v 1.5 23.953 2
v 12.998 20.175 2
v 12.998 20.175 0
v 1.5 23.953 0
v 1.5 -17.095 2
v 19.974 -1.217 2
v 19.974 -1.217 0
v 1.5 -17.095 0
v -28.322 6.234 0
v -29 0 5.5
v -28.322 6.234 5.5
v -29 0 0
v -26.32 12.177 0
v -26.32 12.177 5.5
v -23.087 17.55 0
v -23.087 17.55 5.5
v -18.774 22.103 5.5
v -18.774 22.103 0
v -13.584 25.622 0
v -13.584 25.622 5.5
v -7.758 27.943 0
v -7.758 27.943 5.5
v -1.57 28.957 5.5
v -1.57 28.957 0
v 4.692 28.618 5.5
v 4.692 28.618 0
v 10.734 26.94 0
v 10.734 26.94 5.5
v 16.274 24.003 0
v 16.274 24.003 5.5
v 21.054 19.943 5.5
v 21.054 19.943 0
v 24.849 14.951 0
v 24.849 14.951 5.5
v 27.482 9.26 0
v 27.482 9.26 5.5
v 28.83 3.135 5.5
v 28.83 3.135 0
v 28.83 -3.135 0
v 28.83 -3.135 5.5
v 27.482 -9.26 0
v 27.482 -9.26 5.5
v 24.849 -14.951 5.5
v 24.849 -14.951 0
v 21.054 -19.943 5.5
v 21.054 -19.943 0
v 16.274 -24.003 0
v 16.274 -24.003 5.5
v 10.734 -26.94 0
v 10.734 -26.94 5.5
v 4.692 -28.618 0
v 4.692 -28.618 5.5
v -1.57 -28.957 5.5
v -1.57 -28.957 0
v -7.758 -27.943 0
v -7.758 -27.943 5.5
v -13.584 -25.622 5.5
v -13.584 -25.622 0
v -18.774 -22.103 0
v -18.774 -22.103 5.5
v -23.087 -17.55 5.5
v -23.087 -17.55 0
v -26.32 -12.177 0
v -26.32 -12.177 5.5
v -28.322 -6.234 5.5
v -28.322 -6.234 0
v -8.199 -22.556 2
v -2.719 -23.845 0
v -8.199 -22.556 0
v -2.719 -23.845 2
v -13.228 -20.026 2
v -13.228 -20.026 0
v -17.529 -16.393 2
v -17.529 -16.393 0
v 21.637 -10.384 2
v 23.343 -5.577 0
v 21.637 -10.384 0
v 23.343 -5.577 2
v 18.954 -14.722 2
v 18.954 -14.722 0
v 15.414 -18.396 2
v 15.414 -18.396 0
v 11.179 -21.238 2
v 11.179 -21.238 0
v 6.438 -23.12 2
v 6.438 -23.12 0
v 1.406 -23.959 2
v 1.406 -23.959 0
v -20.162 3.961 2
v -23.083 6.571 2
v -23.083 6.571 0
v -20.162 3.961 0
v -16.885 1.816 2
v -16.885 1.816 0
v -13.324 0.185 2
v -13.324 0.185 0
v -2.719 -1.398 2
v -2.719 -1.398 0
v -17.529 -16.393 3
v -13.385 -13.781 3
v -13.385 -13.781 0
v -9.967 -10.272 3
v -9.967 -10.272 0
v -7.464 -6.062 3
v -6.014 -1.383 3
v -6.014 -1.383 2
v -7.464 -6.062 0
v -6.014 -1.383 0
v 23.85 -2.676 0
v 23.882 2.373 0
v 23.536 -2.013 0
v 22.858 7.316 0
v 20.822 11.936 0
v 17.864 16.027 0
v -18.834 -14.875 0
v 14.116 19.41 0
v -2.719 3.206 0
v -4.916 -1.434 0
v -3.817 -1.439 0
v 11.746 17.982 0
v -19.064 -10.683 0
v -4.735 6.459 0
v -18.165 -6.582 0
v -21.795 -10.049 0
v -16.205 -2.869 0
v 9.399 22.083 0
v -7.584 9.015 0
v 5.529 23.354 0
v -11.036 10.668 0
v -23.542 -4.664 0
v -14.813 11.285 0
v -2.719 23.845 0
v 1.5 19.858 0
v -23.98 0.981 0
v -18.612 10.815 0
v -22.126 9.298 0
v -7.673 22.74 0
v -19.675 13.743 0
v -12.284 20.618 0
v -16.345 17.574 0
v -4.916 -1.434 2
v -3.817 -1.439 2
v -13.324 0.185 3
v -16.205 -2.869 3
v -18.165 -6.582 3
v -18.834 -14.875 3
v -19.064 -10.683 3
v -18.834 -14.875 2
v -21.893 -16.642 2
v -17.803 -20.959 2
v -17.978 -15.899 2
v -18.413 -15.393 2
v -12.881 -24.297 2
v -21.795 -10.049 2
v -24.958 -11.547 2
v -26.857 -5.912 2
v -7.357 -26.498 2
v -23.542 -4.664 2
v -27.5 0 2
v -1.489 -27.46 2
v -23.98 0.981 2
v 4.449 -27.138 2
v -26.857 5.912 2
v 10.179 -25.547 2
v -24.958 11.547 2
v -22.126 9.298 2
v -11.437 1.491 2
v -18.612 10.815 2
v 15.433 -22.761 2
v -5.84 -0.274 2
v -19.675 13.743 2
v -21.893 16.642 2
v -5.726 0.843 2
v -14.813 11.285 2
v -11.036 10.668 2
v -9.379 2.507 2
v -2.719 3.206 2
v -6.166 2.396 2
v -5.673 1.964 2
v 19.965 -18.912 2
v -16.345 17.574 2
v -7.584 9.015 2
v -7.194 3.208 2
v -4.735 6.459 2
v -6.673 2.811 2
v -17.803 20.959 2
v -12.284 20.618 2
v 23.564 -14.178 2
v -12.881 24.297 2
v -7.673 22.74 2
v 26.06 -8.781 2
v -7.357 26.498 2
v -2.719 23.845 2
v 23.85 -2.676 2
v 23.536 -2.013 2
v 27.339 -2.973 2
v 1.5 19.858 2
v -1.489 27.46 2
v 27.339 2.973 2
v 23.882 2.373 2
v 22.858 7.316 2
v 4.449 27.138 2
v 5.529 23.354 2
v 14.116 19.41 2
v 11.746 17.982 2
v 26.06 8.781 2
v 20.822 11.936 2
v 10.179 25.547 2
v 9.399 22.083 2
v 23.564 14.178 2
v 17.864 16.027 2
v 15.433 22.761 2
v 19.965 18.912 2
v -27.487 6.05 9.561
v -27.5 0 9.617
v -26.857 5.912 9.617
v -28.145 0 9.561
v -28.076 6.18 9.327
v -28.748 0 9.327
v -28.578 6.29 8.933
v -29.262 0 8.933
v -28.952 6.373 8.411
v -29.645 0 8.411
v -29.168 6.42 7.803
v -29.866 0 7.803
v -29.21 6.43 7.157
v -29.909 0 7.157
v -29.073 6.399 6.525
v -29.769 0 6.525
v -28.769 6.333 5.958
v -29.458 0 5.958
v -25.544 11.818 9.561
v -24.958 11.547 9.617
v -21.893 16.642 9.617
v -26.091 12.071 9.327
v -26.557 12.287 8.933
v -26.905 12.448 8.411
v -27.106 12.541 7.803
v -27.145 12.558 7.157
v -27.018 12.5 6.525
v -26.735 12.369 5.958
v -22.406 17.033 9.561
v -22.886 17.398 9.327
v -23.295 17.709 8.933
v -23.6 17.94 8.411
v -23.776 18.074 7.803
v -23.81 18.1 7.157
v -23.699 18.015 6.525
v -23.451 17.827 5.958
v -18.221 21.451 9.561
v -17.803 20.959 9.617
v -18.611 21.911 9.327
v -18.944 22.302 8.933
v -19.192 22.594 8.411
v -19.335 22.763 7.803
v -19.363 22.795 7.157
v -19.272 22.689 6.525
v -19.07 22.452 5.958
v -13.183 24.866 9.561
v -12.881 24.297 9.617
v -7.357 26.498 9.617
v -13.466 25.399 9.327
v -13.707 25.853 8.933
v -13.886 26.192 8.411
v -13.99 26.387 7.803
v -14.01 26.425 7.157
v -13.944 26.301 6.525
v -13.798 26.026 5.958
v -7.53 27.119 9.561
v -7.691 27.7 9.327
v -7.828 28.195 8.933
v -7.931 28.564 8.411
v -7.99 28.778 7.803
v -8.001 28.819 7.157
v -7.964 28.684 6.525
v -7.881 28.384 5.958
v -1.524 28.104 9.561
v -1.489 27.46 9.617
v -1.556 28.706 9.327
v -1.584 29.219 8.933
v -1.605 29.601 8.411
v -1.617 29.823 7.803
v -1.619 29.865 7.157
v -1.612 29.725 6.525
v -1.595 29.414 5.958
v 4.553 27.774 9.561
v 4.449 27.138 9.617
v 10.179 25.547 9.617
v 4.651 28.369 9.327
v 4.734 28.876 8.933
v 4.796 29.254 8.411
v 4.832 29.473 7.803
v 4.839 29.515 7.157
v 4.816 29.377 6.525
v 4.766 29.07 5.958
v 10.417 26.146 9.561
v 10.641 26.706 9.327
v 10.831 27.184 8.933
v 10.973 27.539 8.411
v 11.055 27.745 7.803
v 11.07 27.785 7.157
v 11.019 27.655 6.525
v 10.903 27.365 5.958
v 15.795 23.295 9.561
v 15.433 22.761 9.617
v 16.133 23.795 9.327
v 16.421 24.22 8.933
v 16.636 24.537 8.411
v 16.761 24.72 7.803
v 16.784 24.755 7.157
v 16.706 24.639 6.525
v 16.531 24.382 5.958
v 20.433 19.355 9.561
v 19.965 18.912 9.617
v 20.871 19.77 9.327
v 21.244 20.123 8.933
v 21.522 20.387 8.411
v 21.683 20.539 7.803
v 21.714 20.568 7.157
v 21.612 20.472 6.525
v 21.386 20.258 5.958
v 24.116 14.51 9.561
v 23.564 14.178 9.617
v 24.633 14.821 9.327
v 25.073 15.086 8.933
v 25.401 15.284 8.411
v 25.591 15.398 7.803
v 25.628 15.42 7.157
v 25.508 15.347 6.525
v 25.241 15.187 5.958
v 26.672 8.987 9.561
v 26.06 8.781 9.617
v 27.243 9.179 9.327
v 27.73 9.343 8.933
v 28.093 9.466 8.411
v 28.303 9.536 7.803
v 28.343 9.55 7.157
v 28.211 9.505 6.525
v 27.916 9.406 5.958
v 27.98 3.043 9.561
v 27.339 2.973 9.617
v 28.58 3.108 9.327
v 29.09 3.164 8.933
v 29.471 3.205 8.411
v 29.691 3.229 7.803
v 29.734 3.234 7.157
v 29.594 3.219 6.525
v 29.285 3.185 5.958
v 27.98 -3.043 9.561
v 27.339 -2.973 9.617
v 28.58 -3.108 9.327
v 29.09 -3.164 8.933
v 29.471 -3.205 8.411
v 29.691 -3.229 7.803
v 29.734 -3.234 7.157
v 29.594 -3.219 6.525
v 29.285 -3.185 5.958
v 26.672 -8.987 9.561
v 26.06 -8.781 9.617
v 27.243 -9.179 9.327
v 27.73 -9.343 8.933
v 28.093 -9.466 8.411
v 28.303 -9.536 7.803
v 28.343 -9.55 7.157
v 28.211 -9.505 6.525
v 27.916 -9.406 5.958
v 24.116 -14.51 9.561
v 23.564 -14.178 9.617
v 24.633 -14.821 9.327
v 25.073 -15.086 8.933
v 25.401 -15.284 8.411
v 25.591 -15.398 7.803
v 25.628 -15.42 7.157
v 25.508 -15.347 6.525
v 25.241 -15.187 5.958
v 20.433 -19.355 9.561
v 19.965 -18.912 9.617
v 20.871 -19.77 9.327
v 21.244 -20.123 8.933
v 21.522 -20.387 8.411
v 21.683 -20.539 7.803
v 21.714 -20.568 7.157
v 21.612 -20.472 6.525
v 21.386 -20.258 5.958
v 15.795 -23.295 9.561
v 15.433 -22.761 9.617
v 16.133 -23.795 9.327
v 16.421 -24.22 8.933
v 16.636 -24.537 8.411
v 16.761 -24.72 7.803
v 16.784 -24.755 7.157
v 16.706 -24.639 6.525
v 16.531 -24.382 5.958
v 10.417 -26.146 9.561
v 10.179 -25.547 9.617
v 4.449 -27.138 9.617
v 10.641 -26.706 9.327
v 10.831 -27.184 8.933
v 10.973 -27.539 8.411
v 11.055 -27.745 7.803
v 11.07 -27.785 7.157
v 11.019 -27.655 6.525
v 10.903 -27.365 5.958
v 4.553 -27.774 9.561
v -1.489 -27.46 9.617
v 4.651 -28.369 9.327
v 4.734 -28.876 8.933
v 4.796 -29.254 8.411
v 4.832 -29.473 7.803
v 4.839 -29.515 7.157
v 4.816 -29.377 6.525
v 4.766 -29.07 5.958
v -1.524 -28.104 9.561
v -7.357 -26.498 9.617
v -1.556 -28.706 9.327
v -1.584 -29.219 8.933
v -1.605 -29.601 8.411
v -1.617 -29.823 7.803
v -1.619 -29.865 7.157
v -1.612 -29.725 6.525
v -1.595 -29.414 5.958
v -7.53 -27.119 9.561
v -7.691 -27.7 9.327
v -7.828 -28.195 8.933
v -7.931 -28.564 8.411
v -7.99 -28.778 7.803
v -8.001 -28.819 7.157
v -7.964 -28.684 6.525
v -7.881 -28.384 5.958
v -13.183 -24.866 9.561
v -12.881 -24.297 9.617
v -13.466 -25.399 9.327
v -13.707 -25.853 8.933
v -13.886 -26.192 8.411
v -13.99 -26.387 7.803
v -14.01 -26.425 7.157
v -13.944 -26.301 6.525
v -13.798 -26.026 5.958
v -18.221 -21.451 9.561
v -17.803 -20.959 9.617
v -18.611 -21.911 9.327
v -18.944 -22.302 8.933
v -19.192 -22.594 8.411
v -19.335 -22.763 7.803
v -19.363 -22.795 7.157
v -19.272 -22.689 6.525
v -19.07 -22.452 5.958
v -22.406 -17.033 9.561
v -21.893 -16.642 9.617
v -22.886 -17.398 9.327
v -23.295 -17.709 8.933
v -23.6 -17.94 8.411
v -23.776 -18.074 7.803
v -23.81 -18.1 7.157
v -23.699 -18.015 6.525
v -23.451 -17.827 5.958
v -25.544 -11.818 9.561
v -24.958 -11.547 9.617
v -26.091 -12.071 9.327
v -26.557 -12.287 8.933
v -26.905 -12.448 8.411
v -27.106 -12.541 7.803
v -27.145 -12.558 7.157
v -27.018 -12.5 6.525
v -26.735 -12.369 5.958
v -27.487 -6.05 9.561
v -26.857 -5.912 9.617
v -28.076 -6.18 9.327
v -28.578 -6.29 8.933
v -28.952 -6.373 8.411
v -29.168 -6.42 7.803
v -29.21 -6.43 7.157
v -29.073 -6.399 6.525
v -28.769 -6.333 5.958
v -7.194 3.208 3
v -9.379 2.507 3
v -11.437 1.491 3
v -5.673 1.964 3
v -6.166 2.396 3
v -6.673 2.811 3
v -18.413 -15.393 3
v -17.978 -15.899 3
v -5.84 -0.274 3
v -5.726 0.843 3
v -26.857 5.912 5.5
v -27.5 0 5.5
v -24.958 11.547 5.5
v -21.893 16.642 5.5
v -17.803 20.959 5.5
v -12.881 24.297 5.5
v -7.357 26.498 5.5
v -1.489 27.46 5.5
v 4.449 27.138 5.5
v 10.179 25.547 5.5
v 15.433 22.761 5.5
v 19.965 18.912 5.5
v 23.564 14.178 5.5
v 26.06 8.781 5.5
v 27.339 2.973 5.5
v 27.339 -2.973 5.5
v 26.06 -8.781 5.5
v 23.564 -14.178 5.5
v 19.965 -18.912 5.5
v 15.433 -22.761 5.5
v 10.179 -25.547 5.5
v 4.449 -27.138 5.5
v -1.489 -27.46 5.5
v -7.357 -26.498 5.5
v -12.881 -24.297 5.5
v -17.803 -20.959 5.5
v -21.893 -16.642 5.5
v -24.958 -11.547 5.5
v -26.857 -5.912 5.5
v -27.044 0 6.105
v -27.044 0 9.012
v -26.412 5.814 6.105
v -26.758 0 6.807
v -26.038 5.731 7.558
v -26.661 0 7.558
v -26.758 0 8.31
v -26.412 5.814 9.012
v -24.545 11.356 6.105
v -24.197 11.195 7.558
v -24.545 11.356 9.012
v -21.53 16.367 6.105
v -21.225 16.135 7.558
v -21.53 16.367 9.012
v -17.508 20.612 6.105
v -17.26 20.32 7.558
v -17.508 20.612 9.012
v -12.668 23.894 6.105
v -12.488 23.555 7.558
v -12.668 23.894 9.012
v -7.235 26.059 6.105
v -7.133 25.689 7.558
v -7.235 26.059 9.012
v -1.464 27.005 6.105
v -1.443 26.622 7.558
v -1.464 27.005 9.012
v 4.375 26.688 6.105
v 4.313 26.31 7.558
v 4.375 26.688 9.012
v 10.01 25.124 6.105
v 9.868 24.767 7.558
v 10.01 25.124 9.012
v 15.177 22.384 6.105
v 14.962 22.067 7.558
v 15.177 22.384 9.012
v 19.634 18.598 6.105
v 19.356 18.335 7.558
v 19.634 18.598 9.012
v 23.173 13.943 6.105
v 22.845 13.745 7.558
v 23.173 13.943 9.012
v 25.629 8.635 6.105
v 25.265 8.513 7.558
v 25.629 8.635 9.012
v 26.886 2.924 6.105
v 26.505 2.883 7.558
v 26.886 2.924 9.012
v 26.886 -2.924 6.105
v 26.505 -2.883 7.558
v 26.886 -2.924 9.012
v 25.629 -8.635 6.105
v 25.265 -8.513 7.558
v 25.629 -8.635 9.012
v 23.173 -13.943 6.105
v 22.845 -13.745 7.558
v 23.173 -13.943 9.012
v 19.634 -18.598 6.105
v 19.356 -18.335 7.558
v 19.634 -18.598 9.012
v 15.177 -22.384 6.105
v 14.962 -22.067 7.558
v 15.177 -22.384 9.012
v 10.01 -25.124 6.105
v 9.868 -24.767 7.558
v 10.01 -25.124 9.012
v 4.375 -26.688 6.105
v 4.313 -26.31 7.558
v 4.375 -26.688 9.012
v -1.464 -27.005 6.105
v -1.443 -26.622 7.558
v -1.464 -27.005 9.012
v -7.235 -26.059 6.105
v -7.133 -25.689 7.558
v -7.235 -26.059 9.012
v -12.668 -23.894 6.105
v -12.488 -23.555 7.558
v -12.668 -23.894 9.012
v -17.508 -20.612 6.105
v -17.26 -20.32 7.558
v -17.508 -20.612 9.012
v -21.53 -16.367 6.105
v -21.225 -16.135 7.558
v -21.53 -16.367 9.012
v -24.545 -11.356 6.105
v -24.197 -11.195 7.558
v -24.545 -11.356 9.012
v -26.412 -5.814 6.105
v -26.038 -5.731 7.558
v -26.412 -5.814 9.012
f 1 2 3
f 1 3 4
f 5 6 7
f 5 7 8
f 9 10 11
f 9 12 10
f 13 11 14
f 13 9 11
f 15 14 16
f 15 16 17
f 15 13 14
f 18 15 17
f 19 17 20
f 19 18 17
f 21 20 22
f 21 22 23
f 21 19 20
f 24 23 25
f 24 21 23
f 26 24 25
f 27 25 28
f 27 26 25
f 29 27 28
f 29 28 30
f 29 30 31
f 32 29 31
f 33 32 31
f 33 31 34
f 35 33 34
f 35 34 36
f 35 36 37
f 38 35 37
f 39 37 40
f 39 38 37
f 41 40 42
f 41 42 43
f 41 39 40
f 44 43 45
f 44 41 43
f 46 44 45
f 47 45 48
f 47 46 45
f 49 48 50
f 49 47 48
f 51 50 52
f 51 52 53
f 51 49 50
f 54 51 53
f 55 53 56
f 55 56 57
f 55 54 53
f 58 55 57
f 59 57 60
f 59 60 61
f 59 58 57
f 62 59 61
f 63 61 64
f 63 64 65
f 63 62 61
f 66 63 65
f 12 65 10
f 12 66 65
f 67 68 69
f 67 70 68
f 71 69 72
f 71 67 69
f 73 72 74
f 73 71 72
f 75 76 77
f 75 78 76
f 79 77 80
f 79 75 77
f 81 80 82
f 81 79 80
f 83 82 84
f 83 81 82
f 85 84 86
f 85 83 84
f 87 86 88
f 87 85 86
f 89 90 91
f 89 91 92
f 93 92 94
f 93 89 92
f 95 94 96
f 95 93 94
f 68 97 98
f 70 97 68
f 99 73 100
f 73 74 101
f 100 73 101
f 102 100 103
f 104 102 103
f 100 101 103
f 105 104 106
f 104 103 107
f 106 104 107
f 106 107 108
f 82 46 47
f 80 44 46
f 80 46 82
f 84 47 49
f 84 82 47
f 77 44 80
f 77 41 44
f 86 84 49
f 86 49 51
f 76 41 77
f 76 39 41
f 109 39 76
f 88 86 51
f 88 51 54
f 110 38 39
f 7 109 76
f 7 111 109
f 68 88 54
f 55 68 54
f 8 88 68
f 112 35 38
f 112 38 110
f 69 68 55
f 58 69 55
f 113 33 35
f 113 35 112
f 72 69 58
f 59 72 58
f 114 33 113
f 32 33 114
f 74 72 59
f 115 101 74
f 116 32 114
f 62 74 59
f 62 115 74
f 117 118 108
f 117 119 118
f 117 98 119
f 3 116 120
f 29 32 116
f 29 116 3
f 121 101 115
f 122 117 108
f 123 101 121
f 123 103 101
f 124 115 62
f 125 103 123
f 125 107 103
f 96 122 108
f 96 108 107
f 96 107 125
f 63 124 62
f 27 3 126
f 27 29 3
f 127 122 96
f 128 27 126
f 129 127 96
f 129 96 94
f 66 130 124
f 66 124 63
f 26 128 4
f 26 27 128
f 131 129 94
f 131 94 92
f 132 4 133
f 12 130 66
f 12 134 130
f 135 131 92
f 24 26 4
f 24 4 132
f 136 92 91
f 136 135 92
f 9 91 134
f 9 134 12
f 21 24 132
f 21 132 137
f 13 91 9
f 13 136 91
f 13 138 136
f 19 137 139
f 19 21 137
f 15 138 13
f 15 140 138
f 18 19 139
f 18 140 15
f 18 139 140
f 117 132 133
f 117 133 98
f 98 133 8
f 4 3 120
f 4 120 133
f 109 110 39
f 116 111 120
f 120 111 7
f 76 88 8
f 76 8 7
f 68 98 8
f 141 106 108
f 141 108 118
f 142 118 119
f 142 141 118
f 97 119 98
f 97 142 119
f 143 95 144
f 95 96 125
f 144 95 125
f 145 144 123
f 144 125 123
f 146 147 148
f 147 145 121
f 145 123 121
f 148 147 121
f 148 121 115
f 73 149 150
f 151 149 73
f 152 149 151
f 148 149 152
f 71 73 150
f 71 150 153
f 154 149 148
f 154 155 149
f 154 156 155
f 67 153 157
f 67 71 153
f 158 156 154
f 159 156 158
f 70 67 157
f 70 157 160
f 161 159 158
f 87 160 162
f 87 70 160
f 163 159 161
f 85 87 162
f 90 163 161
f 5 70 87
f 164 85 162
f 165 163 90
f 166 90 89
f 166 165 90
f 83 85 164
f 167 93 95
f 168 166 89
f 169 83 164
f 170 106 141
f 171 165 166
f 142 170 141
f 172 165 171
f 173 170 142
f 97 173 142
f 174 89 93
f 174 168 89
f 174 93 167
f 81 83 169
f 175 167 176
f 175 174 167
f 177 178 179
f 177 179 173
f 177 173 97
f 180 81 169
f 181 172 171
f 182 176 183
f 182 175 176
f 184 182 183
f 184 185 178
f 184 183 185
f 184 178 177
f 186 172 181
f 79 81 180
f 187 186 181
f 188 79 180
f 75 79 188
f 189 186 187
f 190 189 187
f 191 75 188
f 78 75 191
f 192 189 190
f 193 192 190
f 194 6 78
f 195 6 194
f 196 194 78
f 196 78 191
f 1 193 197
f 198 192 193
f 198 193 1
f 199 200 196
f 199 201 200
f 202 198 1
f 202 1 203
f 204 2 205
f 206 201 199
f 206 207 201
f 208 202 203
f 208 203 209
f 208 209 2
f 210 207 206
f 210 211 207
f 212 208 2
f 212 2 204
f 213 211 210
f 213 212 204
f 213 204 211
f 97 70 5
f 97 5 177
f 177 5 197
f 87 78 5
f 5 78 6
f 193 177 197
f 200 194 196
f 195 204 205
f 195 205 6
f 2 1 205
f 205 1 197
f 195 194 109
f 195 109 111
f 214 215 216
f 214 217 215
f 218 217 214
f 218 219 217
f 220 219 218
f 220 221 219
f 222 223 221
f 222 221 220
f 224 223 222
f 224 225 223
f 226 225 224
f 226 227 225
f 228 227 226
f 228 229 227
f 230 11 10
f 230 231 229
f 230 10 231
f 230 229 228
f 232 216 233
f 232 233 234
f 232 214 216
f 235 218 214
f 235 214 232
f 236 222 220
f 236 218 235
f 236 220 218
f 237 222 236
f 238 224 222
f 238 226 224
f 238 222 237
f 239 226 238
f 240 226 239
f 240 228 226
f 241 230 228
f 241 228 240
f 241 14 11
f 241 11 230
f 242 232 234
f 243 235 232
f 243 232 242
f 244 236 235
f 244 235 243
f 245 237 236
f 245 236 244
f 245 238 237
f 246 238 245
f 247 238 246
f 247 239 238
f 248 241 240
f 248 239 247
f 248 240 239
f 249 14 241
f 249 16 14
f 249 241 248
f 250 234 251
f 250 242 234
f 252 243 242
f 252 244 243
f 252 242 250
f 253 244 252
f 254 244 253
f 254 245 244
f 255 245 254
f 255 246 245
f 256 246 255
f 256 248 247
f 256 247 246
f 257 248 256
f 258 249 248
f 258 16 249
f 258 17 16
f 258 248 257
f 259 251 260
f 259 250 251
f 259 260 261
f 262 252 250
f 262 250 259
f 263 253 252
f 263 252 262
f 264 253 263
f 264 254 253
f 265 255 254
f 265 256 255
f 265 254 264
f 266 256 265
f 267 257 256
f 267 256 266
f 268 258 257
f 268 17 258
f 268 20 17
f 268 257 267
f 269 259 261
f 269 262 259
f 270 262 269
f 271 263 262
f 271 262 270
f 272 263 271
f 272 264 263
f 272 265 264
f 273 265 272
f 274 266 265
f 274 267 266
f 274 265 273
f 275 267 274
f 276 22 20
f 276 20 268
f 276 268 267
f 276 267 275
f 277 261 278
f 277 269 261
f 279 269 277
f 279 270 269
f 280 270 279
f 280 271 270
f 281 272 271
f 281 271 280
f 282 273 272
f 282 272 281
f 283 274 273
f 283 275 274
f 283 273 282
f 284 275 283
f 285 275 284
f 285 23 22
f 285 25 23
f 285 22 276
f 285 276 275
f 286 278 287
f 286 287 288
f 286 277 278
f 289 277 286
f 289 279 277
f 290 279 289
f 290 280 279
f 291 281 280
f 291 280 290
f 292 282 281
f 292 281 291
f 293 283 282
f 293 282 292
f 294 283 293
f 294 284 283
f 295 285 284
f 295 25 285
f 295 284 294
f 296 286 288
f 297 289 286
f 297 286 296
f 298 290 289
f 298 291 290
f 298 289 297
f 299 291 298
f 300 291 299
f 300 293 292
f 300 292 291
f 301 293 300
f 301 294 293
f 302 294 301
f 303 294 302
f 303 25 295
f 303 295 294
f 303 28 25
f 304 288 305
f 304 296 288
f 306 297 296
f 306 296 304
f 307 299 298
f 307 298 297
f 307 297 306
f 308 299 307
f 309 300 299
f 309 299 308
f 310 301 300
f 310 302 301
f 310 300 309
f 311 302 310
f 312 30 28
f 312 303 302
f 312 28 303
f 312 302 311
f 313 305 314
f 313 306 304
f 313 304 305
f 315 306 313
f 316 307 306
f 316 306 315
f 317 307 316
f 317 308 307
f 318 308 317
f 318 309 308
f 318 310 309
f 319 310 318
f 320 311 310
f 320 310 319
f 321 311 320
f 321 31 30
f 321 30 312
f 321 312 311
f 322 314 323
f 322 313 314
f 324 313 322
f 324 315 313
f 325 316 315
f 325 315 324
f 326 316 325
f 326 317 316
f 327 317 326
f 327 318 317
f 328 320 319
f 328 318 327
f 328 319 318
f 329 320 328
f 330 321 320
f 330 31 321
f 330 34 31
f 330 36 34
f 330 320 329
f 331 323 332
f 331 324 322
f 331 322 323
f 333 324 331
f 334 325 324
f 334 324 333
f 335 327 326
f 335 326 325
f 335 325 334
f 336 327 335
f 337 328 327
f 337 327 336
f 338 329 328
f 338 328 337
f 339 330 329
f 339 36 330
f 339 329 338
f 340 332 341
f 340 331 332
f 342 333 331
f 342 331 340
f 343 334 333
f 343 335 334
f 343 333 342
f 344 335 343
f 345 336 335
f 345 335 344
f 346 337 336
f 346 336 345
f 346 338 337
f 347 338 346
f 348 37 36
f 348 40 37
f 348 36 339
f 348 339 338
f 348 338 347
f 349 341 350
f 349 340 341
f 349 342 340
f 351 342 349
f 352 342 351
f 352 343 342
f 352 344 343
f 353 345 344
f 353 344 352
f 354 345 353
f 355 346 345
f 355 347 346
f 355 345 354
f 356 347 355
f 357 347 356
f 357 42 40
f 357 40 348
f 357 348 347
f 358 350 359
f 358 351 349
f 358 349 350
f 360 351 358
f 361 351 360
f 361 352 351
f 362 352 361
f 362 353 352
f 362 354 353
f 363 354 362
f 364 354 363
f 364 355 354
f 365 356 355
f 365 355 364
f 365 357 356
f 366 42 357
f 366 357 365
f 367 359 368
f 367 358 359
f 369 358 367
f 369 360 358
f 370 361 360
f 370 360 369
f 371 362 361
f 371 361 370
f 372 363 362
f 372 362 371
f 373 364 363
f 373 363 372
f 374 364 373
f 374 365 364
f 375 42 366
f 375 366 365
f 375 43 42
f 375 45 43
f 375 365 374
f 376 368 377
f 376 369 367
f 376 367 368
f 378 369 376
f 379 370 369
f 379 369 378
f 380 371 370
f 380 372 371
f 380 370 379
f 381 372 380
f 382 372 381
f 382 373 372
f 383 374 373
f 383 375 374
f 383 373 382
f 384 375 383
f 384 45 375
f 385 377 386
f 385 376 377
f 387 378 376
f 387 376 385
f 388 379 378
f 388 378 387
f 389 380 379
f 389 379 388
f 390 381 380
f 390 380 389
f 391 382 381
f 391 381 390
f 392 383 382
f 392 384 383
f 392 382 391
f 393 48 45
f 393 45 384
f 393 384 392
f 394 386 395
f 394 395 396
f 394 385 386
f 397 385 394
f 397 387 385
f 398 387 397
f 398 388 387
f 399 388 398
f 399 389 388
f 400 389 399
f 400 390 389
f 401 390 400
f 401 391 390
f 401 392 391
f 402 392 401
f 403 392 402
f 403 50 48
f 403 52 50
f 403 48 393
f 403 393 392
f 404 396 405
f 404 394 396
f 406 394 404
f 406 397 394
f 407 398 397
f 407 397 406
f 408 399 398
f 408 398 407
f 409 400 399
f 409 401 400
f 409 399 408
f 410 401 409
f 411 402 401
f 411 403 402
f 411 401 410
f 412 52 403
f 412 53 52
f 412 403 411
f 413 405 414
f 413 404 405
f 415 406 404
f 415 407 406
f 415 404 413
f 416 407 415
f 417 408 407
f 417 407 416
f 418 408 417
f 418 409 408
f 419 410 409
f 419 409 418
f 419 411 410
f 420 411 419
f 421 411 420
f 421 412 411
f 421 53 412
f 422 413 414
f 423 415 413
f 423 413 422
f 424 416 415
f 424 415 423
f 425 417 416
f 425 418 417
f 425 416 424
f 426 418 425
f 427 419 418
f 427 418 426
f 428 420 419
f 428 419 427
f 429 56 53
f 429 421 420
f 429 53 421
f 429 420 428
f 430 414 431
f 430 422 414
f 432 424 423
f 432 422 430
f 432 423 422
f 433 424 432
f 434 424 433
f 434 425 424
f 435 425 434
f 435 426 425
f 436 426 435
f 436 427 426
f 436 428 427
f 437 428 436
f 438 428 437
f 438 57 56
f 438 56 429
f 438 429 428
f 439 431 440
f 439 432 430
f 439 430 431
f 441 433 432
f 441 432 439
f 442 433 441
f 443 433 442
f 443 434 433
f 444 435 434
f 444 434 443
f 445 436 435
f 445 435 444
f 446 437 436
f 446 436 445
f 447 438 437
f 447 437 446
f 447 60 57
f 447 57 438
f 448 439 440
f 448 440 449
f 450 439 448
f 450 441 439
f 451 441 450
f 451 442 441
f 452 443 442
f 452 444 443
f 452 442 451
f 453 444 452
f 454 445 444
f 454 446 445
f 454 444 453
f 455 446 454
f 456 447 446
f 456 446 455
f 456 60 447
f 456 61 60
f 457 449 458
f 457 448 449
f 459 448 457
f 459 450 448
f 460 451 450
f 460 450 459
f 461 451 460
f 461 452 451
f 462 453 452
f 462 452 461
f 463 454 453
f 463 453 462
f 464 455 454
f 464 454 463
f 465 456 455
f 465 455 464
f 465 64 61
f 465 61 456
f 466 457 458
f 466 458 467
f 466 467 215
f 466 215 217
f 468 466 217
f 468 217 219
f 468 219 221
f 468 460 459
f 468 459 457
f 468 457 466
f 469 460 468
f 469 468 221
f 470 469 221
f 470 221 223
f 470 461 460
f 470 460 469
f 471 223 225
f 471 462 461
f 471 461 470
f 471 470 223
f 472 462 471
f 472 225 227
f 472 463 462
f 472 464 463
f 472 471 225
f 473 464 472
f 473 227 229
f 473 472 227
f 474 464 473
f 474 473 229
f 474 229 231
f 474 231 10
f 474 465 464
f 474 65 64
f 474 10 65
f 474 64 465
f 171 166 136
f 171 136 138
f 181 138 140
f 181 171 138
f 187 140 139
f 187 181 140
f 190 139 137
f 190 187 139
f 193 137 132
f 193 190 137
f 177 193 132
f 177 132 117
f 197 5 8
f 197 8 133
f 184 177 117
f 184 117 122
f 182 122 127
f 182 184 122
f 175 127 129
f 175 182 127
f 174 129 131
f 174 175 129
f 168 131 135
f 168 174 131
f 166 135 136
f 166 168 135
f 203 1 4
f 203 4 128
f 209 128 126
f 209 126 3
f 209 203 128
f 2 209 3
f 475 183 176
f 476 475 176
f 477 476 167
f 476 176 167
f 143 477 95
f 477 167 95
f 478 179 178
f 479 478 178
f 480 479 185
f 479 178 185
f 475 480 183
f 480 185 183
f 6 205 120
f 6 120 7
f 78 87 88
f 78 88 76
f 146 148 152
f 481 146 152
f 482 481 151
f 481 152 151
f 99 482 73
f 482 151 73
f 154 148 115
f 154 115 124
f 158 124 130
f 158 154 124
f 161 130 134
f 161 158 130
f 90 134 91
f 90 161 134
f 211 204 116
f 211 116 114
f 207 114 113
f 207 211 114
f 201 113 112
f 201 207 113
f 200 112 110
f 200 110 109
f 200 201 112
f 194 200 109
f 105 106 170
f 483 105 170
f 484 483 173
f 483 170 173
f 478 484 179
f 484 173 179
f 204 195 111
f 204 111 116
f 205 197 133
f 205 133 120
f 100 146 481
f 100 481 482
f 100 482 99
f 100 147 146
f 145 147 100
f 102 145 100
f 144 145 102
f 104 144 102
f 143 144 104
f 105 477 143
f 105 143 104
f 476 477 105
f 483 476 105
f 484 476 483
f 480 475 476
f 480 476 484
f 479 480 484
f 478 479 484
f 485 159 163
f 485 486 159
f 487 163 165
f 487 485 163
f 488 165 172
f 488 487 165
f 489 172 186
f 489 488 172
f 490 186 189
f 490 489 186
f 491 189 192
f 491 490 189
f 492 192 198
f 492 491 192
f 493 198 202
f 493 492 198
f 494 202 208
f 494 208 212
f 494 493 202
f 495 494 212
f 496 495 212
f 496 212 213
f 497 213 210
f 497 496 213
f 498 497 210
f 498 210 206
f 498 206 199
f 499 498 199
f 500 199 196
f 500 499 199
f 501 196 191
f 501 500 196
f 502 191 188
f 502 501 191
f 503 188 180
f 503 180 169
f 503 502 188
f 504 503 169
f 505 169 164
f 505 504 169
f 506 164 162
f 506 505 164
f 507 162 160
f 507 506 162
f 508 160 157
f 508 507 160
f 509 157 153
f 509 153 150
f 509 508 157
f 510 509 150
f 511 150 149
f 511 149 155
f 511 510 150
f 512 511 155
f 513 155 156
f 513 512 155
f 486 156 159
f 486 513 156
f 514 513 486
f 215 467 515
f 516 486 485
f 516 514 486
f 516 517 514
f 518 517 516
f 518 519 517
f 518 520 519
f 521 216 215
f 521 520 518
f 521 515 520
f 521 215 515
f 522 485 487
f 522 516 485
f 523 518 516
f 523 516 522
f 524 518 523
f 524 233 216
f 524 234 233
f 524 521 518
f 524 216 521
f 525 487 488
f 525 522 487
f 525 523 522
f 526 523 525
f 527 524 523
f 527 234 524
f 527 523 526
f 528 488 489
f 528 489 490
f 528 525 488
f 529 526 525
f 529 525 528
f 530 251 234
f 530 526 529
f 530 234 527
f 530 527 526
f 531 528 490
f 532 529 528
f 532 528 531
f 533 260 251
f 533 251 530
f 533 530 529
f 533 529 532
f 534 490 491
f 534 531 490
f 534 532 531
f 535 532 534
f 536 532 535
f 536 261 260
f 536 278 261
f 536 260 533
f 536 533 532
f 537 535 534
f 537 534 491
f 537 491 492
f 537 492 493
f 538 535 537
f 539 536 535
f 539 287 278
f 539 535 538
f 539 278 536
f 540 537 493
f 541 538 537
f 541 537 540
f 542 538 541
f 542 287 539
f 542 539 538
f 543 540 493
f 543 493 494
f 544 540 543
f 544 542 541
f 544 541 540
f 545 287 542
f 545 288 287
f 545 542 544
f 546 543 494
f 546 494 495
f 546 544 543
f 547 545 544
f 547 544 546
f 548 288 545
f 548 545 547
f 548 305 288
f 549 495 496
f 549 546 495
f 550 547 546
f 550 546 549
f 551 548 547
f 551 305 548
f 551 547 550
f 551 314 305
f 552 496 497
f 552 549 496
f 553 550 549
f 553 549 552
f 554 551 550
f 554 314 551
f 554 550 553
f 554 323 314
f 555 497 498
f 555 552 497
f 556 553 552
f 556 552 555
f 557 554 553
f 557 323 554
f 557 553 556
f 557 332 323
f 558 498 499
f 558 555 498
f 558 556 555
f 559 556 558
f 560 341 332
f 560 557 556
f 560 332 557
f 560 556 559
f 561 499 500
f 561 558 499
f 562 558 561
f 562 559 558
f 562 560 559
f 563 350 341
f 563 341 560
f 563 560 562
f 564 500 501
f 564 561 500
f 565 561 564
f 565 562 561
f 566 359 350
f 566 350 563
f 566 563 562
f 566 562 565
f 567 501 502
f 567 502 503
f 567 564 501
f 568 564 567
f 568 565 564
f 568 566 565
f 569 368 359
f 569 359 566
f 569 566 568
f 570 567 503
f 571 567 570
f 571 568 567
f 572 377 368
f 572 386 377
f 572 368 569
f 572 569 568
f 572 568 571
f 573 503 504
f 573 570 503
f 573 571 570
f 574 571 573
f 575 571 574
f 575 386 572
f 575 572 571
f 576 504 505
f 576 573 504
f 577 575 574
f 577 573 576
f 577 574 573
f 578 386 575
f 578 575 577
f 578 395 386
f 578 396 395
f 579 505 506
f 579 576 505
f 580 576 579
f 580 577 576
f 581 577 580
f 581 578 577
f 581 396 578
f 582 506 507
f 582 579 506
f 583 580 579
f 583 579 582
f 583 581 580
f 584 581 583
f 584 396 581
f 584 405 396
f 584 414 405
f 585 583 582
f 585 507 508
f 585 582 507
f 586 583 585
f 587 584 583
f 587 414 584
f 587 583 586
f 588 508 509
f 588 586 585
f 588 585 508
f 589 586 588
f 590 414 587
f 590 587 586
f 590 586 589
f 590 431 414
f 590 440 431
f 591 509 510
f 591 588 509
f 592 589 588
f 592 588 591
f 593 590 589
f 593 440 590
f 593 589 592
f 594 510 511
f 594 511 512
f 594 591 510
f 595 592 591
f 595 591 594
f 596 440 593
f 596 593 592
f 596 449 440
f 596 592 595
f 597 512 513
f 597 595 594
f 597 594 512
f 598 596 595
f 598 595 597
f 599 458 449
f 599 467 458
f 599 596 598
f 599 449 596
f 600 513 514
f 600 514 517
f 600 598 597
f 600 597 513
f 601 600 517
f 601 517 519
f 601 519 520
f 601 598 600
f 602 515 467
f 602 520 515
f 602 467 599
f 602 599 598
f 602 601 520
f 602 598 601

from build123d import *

# Parameters (mm, degrees)
F3_DEPTH = 2
F4_DEPTH = 1


# Not quite as in the source:
# - a feature names something its author has since deleted; it is built from what else it names


with BuildPart() as f1:
    # F0 (on Front) → F1 (revolve)
    with BuildSketch(Plane.XZ):
        Polygon((-29, 0), (-24, 0), (-24, 2), (-27.5, 2), (-27.5, 5.5), (-29, 5.5), align=None)
        with BuildLine():
            ThreePointArc((-27.5, 9.6169896424), (-29.7772258205, 8.1149302096), (-29, 5.5))
            Line((-29, 5.5), (-27.5, 5.5))
            ThreePointArc((-27.5, 5.5), (-26.6610115833, 7.5584948212), (-27.5, 9.6169896424))
        make_face()
    revolve(axis=Axis((0, 0, 2.7132770047), (0, 0, -1)))

    # F2 (on face) → F3 (join)
    with BuildSketch(Plane.XY.offset(2)):
        with BuildLine():
            Line((23.5357220544, -2.0133285341), (14.1158952872, 19.40982999))
            ThreePointArc((14.1158952872, 19.40982999), (13.5624984717, 19.8004705804), (12.9982976167, 20.1753378923))
            Line((12.9982976167, 20.1753378923), (1.5001369464, 23.9530705577))
            ThreePointArc((1.5001369464, 23.9530705577), (-0.61185618, 23.9921993993), (-2.7191094967, 23.8454700844))
            Line((-2.7191094967, 23.8454700844), (-2.7191094967, 3.205855377))
            Line((-2.7191094967, 3.205855377), (-2.7191094967, -1.398249995))
            Line((-2.7191094967, -1.398249995), (-2.7191094967, -23.8454700844))
            ThreePointArc((-2.7191094967, -23.8454700844), (-0.6587764532, -23.9909569127), (1.406435812, -23.9587549407))
            Line((1.406435812, -23.9587549407), (23.3430031088, -5.5771144744))
            ThreePointArc((23.3430031088, -5.5771144744), (23.6412294167, -4.1342800662), (23.8503615327, -2.6758652355))
            Line((23.8503615327, -2.6758652355), (23.5357220544, -2.0133285341))
        make_face()
        Polygon((1.5001369464, -17.0947052702), (1.5001369464, 19.8581963794), (11.7461745714, 17.9819713885), (19.9739150703, -1.2165056542), align=None, mode=Mode.SUBTRACT)
        with BuildLine():
            ThreePointArc((-2.7191094967, 3.205855377), (-11.036038033, 10.667911986), (-22.125575094, 9.2983292455))
            ThreePointArc((-22.125575094, 9.2983292455), (-22.6453594845, 7.9490687392), (-23.0829490937, 6.5709558771))
            ThreePointArc((-23.0829490937, 6.5709558771), (-14.7738683342, 6.6118059769), (-7.1936681304, 3.2084169794))
            ThreePointArc((-7.1936681304, 3.2084169794), (-6.4176007096, 2.6054477842), (-5.6727145132, 1.9643572708))
            ThreePointArc((-5.6727145132, 1.9643572708), (-4.0996738523, 0.3675861057), (-2.7191094967, -1.398249995))
            Line((-2.7191094967, -1.398249995), (-2.7191094967, 3.205855377))
        make_face()
        with BuildLine():
            ThreePointArc((-7.1936681304, 3.2084169794), (-14.7738683342, 6.6118059769), (-23.0829490937, 6.5709558771))
            ThreePointArc((-23.0829490937, 6.5709558771), (-18.5638120771, 2.8268811021), (-13.3236565945, 0.1846347444))
            ThreePointArc((-13.3236565945, 0.1846347444), (-10.4265323426, 2.0368417185), (-7.1936681304, 3.2084169794))
        make_face()
        with BuildLine():
            ThreePointArc((-13.3236565945, 0.1846347444), (-9.7250792571, -0.8614617254), (-6.0139401649, -1.3825407177))
            ThreePointArc((-6.0139401649, -1.3825407177), (-5.7755854856, 0.2840018043), (-5.6727145132, 1.9643572708))
            ThreePointArc((-5.6727145132, 1.9643572708), (-6.4176007096, 2.6054477842), (-7.1936681304, 3.2084169794))
            ThreePointArc((-7.1936681304, 3.2084169794), (-10.4265323426, 2.0368417185), (-13.3236565945, 0.1846347444))
        make_face()
        with BuildLine():
            ThreePointArc((-18.8341819929, -14.8752676836), (-18.1973718669, -15.6478642996), (-17.528892227, -16.3932283976))
            ThreePointArc((-17.528892227, -16.3932283976), (-9.9671253359, -10.2719865524), (-6.0139401649, -1.3825407177))
            ThreePointArc((-6.0139401649, -1.3825407177), (-9.7250792571, -0.8614617254), (-13.3236565945, 0.1846347444))
            ThreePointArc((-13.3236565945, 0.1846347444), (-18.1653516525, -6.5818760317), (-18.8341819929, -14.8752676836))
        make_face()
        with BuildLine():
            ThreePointArc((-6.0139401649, -1.3825407177), (-4.3667724447, -1.4423293633), (-2.7191094967, -1.398249995))
            ThreePointArc((-2.7191094967, -1.398249995), (-4.0996738523, 0.3675861057), (-5.6727145132, 1.9643572708))
            ThreePointArc((-5.6727145132, 1.9643572708), (-5.7755854856, 0.2840018043), (-6.0139401649, -1.3825407177))
        make_face()
    extrude(amount=-F3_DEPTH)

    # F2 (on face) → F4 (join)
    with BuildSketch(Plane.XY.offset(2)):
        with BuildLine():
            ThreePointArc((-18.8341819929, -14.8752676836), (-18.1973718669, -15.6478642996), (-17.528892227, -16.3932283976))
            ThreePointArc((-17.528892227, -16.3932283976), (-9.9671253359, -10.2719865524), (-6.0139401649, -1.3825407177))
            ThreePointArc((-6.0139401649, -1.3825407177), (-9.7250792571, -0.8614617254), (-13.3236565945, 0.1846347444))
            ThreePointArc((-13.3236565945, 0.1846347444), (-18.1653516525, -6.5818760317), (-18.8341819929, -14.8752676836))
        make_face()
        with BuildLine():
            ThreePointArc((-13.3236565945, 0.1846347444), (-9.7250792571, -0.8614617254), (-6.0139401649, -1.3825407177))
            ThreePointArc((-6.0139401649, -1.3825407177), (-5.7755854856, 0.2840018043), (-5.6727145132, 1.9643572708))
            ThreePointArc((-5.6727145132, 1.9643572708), (-6.4176007096, 2.6054477842), (-7.1936681304, 3.2084169794))
            ThreePointArc((-7.1936681304, 3.2084169794), (-10.4265323426, 2.0368417185), (-13.3236565945, 0.1846347444))
        make_face()
    extrude(amount=F4_DEPTH)


solid = f1.part
